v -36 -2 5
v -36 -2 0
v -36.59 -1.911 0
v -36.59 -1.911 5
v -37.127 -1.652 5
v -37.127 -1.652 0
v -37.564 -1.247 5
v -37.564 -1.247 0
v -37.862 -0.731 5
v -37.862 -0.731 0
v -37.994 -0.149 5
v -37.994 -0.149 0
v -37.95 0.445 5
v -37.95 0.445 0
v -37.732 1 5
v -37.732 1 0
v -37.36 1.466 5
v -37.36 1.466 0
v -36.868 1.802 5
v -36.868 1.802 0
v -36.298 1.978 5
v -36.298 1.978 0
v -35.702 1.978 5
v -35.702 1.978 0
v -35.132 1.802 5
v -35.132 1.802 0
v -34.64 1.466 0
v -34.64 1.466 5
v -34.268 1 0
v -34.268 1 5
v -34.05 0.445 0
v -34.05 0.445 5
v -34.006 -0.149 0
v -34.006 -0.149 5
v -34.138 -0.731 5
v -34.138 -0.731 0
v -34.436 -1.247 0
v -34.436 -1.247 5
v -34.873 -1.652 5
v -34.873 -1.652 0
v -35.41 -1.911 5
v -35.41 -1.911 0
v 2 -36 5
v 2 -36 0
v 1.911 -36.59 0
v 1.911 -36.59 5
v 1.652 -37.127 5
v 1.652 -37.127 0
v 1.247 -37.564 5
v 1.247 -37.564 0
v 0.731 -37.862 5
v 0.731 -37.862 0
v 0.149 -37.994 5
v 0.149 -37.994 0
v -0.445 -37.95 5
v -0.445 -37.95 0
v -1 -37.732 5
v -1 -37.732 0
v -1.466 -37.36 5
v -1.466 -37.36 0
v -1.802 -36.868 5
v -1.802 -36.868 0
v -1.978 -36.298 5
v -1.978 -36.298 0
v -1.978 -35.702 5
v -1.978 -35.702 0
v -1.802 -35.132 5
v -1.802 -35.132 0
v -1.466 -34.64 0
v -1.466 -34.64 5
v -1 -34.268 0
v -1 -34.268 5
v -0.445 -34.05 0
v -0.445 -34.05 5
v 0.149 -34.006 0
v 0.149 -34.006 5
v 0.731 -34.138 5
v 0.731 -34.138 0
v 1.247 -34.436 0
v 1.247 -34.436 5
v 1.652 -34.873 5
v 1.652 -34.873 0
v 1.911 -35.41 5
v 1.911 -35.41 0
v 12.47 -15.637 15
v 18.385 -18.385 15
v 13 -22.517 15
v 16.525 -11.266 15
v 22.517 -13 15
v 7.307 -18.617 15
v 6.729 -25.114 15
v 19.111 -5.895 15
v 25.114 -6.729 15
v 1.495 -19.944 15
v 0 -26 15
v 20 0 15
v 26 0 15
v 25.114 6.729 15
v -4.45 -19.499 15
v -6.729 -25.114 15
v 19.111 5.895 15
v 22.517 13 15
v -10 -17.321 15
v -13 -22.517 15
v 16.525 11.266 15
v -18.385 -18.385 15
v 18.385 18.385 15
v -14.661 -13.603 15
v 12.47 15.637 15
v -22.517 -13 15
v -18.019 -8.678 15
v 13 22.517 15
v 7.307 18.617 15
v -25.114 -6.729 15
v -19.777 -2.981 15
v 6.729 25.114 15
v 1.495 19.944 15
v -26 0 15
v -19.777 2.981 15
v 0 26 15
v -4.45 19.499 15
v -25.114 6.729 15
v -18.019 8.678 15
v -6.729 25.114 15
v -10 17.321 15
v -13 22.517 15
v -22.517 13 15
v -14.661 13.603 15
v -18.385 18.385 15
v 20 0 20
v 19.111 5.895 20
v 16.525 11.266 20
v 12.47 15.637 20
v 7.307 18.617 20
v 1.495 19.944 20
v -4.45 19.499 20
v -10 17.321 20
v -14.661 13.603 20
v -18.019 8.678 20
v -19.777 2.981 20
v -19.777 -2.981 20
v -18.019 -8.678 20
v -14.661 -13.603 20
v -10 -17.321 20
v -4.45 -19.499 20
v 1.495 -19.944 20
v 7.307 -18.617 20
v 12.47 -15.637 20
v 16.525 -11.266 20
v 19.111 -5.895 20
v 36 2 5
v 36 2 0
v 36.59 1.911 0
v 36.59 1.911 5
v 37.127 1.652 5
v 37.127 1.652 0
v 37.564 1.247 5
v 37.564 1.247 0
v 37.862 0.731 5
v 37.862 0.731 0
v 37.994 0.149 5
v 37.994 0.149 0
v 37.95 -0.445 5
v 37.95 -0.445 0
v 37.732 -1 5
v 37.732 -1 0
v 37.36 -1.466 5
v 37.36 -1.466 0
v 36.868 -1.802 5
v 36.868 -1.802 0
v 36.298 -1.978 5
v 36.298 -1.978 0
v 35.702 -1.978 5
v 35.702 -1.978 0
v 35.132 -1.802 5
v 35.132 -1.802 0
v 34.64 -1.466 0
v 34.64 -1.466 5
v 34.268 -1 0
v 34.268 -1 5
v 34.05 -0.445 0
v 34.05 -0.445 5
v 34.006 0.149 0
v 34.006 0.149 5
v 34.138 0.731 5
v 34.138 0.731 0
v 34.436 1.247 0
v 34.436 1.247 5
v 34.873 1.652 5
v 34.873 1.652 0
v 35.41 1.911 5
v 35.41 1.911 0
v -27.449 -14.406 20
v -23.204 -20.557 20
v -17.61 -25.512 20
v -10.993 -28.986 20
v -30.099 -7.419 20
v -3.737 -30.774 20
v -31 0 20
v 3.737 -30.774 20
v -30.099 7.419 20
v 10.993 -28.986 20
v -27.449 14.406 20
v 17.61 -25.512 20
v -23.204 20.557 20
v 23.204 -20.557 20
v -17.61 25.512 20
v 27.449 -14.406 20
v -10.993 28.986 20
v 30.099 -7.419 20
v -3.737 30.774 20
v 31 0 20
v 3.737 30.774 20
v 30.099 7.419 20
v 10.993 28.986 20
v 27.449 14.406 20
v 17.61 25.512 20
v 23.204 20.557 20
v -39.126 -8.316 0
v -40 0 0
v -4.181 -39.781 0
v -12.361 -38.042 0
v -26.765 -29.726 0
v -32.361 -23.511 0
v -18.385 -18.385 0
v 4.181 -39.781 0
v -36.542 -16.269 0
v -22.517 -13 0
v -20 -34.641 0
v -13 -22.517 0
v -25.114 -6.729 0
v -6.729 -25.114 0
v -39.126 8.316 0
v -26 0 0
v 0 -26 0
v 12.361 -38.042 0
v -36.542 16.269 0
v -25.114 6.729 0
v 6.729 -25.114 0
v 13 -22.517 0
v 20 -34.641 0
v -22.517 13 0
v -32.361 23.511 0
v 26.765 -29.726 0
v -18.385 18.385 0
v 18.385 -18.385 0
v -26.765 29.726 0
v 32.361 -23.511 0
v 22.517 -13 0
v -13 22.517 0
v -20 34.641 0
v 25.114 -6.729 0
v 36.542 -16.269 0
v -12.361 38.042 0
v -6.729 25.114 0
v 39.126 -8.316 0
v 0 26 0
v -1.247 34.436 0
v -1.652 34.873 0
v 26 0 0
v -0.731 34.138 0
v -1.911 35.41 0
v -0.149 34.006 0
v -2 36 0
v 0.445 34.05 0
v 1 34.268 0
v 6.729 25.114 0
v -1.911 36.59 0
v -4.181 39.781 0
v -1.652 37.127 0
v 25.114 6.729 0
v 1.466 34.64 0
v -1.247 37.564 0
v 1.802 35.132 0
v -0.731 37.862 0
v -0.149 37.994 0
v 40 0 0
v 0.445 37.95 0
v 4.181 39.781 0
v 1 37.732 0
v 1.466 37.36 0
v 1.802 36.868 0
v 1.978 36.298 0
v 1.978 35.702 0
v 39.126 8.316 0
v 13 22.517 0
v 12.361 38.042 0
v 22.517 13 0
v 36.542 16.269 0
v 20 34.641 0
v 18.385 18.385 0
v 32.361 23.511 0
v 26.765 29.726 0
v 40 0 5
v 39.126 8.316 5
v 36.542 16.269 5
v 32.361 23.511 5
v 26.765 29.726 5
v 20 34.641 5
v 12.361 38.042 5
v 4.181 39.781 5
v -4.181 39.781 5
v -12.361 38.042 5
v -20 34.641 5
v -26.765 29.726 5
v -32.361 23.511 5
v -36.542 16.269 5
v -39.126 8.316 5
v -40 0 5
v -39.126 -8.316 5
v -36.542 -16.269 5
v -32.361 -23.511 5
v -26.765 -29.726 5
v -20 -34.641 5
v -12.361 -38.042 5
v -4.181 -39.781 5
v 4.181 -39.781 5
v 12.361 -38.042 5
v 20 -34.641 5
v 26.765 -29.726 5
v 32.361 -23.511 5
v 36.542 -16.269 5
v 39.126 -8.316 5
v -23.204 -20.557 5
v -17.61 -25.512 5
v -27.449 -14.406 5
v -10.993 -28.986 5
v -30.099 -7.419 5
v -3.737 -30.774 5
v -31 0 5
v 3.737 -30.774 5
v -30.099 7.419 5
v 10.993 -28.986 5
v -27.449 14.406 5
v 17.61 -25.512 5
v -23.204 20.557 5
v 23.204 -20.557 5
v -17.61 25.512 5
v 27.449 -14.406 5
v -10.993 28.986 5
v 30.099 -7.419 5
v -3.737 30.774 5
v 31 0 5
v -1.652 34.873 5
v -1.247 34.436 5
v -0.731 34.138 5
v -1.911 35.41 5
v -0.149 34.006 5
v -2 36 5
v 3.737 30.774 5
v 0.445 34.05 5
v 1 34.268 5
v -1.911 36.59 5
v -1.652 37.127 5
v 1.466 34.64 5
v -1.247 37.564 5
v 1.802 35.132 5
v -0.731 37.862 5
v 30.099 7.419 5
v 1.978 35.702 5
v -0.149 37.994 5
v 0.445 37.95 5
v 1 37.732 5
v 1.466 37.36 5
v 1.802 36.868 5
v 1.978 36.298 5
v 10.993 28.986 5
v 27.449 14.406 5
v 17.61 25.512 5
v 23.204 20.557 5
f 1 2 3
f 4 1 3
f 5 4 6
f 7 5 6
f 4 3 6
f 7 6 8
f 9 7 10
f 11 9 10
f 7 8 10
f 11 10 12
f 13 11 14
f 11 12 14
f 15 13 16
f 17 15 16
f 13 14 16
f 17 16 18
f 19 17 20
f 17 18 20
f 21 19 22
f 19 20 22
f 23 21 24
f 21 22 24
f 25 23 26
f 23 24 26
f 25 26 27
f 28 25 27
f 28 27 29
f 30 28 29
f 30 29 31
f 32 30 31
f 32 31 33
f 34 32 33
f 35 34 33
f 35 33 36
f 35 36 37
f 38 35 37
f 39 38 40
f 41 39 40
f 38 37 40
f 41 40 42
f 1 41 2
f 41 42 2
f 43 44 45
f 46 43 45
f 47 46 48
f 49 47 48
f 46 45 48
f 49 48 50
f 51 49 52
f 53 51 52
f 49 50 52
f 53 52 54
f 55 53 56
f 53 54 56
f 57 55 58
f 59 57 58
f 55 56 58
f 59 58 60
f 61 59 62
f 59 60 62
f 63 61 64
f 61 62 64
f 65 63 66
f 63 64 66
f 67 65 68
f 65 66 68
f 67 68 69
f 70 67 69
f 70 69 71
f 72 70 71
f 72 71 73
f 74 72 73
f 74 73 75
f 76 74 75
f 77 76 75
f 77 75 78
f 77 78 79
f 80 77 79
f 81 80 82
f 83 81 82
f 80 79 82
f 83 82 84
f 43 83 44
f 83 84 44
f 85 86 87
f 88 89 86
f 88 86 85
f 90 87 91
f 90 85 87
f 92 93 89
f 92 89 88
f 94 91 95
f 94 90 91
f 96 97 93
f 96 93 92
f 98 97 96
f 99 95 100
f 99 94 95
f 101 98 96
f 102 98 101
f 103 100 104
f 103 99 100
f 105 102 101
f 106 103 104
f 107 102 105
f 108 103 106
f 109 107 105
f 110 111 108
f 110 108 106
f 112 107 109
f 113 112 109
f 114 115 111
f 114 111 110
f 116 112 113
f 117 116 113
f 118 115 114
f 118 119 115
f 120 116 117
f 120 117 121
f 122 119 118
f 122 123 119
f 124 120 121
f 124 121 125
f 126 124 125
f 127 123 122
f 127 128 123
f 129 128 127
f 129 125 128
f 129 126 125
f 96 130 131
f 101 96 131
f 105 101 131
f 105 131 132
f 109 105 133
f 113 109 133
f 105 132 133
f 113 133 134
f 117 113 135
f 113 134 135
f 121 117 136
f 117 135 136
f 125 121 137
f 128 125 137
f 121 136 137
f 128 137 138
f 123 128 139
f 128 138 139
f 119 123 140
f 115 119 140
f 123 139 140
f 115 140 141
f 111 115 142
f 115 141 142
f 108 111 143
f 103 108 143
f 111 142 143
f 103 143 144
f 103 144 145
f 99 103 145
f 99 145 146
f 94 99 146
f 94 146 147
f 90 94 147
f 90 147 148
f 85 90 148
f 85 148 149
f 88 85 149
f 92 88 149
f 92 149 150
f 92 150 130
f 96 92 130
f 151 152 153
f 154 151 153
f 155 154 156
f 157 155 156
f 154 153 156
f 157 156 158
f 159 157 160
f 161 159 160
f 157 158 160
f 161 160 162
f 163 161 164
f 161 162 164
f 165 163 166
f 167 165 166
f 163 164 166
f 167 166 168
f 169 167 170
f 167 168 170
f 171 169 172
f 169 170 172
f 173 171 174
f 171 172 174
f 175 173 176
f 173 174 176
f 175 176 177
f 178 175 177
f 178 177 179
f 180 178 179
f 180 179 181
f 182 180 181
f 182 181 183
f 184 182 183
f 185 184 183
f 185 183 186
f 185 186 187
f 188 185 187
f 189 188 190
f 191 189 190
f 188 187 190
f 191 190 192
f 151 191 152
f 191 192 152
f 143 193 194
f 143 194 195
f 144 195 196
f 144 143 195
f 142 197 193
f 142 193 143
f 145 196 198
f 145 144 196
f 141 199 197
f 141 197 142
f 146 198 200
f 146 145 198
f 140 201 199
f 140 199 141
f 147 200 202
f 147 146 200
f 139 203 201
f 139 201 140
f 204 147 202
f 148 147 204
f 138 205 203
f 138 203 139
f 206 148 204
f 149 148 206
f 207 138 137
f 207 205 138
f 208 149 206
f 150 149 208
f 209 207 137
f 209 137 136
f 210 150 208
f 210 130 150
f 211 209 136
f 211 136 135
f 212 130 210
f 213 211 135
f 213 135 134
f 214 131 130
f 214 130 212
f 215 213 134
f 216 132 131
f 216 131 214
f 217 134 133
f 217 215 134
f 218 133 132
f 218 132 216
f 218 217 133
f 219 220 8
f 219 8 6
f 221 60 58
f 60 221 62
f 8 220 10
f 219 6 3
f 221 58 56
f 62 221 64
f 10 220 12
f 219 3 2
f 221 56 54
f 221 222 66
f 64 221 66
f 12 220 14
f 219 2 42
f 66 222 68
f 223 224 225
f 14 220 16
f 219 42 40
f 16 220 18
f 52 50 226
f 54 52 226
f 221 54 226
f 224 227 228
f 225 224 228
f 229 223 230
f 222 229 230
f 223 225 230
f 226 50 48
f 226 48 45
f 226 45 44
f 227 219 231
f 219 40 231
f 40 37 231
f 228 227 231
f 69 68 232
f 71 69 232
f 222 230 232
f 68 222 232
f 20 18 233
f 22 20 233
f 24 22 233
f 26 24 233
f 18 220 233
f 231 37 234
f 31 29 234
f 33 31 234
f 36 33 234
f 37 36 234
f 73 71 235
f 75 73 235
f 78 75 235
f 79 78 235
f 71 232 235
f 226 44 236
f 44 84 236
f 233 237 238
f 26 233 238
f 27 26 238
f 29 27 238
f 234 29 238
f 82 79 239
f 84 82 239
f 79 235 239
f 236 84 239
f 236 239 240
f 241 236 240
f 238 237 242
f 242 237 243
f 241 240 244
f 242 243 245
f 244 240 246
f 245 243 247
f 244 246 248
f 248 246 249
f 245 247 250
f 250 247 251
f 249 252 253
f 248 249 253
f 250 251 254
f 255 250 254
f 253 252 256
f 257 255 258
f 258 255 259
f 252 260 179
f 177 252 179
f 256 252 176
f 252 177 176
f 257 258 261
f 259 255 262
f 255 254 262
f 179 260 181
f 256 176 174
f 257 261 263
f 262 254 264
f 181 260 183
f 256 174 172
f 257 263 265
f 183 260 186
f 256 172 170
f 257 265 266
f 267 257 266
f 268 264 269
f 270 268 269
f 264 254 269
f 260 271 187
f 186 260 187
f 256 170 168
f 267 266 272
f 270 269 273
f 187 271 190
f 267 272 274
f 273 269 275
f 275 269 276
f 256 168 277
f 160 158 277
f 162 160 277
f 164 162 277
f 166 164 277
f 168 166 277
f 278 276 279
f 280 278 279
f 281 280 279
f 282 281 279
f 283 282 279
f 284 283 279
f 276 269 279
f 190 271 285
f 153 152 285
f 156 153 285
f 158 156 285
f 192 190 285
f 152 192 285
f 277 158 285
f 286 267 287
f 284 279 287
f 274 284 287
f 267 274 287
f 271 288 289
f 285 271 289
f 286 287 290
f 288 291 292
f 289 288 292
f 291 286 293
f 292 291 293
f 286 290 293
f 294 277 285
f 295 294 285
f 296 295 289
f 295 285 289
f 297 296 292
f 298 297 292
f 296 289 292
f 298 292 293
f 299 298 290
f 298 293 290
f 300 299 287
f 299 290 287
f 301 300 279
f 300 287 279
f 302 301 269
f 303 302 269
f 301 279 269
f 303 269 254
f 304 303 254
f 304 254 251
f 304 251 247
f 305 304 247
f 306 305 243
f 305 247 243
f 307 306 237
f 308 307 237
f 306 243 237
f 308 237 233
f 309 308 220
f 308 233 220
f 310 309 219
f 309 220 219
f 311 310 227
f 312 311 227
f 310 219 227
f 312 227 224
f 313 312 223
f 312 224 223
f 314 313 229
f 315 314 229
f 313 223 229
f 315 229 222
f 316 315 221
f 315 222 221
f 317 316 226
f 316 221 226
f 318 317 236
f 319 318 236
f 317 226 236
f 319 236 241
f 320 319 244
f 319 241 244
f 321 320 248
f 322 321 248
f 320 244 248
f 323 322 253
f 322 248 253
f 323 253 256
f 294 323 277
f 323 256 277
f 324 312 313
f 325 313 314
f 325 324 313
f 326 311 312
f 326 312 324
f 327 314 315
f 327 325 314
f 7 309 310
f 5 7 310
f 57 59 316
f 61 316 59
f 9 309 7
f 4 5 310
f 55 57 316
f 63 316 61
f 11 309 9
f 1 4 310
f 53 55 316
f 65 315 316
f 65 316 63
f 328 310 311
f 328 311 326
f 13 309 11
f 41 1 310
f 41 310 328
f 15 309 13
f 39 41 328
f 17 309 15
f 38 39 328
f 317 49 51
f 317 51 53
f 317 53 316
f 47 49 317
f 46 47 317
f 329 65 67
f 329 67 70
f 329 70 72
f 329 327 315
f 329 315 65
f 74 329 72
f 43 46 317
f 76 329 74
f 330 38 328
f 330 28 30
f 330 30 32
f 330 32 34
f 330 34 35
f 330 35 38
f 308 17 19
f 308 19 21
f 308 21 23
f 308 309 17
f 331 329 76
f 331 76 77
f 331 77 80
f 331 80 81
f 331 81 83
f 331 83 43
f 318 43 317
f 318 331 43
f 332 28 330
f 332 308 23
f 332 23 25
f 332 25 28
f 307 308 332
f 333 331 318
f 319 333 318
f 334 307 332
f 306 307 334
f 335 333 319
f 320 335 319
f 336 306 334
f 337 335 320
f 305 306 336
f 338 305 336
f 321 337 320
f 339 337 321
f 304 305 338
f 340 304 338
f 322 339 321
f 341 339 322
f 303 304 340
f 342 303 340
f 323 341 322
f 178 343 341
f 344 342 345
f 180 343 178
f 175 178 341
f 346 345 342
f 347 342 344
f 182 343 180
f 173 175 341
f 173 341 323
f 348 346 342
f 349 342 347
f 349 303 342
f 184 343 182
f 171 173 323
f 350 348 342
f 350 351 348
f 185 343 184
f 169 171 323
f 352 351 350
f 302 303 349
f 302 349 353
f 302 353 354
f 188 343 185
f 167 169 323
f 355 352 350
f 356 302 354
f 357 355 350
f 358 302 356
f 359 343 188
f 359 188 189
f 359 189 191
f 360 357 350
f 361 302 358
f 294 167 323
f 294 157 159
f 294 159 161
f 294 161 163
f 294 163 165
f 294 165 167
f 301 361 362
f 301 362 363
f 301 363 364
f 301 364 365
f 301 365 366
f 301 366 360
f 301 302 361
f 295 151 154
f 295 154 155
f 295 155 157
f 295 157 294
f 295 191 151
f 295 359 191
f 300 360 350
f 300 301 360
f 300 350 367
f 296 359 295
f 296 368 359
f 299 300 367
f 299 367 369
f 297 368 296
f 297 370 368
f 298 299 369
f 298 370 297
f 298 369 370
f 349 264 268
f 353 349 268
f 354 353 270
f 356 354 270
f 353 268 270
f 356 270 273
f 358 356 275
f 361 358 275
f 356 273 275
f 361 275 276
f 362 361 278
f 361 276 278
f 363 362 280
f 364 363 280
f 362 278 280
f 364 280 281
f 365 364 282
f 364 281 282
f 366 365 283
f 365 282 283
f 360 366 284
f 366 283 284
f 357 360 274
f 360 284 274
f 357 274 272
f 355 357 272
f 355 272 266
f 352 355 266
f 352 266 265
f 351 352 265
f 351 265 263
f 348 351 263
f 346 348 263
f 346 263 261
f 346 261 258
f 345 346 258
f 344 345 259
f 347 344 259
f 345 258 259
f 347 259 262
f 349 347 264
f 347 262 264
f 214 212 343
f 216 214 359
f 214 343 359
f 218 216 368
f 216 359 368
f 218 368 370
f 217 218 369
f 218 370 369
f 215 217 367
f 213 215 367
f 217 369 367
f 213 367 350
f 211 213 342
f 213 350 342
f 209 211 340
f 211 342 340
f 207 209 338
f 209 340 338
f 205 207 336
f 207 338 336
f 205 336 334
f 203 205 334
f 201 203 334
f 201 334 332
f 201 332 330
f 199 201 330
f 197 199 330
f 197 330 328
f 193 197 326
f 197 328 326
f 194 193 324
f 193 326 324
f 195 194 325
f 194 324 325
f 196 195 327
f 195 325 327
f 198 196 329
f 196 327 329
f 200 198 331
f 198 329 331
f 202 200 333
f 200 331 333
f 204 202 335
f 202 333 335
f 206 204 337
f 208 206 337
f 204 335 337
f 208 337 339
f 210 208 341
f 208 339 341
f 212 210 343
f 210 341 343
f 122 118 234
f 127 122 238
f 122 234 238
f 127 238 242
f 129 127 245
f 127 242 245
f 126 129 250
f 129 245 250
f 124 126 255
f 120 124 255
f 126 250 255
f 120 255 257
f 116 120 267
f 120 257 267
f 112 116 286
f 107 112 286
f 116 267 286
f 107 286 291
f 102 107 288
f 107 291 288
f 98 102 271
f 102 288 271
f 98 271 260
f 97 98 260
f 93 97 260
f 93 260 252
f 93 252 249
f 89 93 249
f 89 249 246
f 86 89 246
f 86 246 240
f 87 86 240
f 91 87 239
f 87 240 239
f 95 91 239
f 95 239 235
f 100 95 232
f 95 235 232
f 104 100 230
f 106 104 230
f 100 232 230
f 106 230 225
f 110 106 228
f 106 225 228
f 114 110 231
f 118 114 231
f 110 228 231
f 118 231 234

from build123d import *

# Parameters (mm, degrees)
SKETCH_1_R               = 40
EXTRUDE_1_DEPTH          = 5
SKETCH_2_R               = 31
EXTRUDE_2_DEPTH          = 12
SKETCH_3_R               = 26
CUT_EXTRUDE_1_DEPTH      = 15
SKETCH_4_R               = 31
EXTRUDE_3_DEPTH          = 3
SKETCH_6_R               = 2
CUT_EXTRUDE_3_DEPTH      = 5
PATTERN_CIRCULAR_1_COUNT = 4
SKETCH_7_R               = 20
CUT_EXTRUDE_4_DEPTH      = 10


with BuildPart() as part:
    # 草图1 → 凸台-拉伸1 (new body)
    with BuildSketch(Plane.XY):
        Circle(SKETCH_1_R)
    extrude(amount=EXTRUDE_1_DEPTH)

    # 草图2 → 凸台-拉伸2 (add)
    with BuildSketch(Plane.XY.offset(5)):
        Circle(SKETCH_2_R)
    extrude(amount=EXTRUDE_2_DEPTH)

    # 草图3 → 切除-拉伸1 (cut)
    with BuildSketch(Plane(origin=(0, 0, 0), x_dir=(-1, 0, 0), z_dir=(0, 0, -1))):
        Circle(SKETCH_3_R)
    extrude(amount=-CUT_EXTRUDE_1_DEPTH, mode=Mode.SUBTRACT)

    # 草图4 → 凸台-拉伸3 (add)
    with BuildSketch(Plane.XY.offset(17)):
        Circle(SKETCH_4_R)
    extrude(amount=EXTRUDE_3_DEPTH)

    # 草图6 → 切除-拉伸3 (cut)
    with BuildSketch(Plane(origin=(0, 0, 0), x_dir=(-1, 0, 0), z_dir=(0, 0, -1))):
        with Locations((0, 36)):
            Circle(SKETCH_6_R)
    cut_extrude_3 = extrude(amount=-CUT_EXTRUDE_3_DEPTH, mode=Mode.SUBTRACT)

    # 阵列(圆周)1: 切除-拉伸3 ×4 about axis
    pattern_circular_1_axis = Axis((0, 0, 0), (0, 0, 1))
    for i in range(1, PATTERN_CIRCULAR_1_COUNT):
        add(cut_extrude_3.rotate(pattern_circular_1_axis, i * 360 / PATTERN_CIRCULAR_1_COUNT), mode=Mode.SUBTRACT)

    # 草图7 → 切除-拉伸4 (cut)
    with BuildSketch(Plane.XY.offset(20)):
        Circle(SKETCH_7_R)
    extrude(amount=-CUT_EXTRUDE_4_DEPTH, mode=Mode.SUBTRACT)


solid = part.part
